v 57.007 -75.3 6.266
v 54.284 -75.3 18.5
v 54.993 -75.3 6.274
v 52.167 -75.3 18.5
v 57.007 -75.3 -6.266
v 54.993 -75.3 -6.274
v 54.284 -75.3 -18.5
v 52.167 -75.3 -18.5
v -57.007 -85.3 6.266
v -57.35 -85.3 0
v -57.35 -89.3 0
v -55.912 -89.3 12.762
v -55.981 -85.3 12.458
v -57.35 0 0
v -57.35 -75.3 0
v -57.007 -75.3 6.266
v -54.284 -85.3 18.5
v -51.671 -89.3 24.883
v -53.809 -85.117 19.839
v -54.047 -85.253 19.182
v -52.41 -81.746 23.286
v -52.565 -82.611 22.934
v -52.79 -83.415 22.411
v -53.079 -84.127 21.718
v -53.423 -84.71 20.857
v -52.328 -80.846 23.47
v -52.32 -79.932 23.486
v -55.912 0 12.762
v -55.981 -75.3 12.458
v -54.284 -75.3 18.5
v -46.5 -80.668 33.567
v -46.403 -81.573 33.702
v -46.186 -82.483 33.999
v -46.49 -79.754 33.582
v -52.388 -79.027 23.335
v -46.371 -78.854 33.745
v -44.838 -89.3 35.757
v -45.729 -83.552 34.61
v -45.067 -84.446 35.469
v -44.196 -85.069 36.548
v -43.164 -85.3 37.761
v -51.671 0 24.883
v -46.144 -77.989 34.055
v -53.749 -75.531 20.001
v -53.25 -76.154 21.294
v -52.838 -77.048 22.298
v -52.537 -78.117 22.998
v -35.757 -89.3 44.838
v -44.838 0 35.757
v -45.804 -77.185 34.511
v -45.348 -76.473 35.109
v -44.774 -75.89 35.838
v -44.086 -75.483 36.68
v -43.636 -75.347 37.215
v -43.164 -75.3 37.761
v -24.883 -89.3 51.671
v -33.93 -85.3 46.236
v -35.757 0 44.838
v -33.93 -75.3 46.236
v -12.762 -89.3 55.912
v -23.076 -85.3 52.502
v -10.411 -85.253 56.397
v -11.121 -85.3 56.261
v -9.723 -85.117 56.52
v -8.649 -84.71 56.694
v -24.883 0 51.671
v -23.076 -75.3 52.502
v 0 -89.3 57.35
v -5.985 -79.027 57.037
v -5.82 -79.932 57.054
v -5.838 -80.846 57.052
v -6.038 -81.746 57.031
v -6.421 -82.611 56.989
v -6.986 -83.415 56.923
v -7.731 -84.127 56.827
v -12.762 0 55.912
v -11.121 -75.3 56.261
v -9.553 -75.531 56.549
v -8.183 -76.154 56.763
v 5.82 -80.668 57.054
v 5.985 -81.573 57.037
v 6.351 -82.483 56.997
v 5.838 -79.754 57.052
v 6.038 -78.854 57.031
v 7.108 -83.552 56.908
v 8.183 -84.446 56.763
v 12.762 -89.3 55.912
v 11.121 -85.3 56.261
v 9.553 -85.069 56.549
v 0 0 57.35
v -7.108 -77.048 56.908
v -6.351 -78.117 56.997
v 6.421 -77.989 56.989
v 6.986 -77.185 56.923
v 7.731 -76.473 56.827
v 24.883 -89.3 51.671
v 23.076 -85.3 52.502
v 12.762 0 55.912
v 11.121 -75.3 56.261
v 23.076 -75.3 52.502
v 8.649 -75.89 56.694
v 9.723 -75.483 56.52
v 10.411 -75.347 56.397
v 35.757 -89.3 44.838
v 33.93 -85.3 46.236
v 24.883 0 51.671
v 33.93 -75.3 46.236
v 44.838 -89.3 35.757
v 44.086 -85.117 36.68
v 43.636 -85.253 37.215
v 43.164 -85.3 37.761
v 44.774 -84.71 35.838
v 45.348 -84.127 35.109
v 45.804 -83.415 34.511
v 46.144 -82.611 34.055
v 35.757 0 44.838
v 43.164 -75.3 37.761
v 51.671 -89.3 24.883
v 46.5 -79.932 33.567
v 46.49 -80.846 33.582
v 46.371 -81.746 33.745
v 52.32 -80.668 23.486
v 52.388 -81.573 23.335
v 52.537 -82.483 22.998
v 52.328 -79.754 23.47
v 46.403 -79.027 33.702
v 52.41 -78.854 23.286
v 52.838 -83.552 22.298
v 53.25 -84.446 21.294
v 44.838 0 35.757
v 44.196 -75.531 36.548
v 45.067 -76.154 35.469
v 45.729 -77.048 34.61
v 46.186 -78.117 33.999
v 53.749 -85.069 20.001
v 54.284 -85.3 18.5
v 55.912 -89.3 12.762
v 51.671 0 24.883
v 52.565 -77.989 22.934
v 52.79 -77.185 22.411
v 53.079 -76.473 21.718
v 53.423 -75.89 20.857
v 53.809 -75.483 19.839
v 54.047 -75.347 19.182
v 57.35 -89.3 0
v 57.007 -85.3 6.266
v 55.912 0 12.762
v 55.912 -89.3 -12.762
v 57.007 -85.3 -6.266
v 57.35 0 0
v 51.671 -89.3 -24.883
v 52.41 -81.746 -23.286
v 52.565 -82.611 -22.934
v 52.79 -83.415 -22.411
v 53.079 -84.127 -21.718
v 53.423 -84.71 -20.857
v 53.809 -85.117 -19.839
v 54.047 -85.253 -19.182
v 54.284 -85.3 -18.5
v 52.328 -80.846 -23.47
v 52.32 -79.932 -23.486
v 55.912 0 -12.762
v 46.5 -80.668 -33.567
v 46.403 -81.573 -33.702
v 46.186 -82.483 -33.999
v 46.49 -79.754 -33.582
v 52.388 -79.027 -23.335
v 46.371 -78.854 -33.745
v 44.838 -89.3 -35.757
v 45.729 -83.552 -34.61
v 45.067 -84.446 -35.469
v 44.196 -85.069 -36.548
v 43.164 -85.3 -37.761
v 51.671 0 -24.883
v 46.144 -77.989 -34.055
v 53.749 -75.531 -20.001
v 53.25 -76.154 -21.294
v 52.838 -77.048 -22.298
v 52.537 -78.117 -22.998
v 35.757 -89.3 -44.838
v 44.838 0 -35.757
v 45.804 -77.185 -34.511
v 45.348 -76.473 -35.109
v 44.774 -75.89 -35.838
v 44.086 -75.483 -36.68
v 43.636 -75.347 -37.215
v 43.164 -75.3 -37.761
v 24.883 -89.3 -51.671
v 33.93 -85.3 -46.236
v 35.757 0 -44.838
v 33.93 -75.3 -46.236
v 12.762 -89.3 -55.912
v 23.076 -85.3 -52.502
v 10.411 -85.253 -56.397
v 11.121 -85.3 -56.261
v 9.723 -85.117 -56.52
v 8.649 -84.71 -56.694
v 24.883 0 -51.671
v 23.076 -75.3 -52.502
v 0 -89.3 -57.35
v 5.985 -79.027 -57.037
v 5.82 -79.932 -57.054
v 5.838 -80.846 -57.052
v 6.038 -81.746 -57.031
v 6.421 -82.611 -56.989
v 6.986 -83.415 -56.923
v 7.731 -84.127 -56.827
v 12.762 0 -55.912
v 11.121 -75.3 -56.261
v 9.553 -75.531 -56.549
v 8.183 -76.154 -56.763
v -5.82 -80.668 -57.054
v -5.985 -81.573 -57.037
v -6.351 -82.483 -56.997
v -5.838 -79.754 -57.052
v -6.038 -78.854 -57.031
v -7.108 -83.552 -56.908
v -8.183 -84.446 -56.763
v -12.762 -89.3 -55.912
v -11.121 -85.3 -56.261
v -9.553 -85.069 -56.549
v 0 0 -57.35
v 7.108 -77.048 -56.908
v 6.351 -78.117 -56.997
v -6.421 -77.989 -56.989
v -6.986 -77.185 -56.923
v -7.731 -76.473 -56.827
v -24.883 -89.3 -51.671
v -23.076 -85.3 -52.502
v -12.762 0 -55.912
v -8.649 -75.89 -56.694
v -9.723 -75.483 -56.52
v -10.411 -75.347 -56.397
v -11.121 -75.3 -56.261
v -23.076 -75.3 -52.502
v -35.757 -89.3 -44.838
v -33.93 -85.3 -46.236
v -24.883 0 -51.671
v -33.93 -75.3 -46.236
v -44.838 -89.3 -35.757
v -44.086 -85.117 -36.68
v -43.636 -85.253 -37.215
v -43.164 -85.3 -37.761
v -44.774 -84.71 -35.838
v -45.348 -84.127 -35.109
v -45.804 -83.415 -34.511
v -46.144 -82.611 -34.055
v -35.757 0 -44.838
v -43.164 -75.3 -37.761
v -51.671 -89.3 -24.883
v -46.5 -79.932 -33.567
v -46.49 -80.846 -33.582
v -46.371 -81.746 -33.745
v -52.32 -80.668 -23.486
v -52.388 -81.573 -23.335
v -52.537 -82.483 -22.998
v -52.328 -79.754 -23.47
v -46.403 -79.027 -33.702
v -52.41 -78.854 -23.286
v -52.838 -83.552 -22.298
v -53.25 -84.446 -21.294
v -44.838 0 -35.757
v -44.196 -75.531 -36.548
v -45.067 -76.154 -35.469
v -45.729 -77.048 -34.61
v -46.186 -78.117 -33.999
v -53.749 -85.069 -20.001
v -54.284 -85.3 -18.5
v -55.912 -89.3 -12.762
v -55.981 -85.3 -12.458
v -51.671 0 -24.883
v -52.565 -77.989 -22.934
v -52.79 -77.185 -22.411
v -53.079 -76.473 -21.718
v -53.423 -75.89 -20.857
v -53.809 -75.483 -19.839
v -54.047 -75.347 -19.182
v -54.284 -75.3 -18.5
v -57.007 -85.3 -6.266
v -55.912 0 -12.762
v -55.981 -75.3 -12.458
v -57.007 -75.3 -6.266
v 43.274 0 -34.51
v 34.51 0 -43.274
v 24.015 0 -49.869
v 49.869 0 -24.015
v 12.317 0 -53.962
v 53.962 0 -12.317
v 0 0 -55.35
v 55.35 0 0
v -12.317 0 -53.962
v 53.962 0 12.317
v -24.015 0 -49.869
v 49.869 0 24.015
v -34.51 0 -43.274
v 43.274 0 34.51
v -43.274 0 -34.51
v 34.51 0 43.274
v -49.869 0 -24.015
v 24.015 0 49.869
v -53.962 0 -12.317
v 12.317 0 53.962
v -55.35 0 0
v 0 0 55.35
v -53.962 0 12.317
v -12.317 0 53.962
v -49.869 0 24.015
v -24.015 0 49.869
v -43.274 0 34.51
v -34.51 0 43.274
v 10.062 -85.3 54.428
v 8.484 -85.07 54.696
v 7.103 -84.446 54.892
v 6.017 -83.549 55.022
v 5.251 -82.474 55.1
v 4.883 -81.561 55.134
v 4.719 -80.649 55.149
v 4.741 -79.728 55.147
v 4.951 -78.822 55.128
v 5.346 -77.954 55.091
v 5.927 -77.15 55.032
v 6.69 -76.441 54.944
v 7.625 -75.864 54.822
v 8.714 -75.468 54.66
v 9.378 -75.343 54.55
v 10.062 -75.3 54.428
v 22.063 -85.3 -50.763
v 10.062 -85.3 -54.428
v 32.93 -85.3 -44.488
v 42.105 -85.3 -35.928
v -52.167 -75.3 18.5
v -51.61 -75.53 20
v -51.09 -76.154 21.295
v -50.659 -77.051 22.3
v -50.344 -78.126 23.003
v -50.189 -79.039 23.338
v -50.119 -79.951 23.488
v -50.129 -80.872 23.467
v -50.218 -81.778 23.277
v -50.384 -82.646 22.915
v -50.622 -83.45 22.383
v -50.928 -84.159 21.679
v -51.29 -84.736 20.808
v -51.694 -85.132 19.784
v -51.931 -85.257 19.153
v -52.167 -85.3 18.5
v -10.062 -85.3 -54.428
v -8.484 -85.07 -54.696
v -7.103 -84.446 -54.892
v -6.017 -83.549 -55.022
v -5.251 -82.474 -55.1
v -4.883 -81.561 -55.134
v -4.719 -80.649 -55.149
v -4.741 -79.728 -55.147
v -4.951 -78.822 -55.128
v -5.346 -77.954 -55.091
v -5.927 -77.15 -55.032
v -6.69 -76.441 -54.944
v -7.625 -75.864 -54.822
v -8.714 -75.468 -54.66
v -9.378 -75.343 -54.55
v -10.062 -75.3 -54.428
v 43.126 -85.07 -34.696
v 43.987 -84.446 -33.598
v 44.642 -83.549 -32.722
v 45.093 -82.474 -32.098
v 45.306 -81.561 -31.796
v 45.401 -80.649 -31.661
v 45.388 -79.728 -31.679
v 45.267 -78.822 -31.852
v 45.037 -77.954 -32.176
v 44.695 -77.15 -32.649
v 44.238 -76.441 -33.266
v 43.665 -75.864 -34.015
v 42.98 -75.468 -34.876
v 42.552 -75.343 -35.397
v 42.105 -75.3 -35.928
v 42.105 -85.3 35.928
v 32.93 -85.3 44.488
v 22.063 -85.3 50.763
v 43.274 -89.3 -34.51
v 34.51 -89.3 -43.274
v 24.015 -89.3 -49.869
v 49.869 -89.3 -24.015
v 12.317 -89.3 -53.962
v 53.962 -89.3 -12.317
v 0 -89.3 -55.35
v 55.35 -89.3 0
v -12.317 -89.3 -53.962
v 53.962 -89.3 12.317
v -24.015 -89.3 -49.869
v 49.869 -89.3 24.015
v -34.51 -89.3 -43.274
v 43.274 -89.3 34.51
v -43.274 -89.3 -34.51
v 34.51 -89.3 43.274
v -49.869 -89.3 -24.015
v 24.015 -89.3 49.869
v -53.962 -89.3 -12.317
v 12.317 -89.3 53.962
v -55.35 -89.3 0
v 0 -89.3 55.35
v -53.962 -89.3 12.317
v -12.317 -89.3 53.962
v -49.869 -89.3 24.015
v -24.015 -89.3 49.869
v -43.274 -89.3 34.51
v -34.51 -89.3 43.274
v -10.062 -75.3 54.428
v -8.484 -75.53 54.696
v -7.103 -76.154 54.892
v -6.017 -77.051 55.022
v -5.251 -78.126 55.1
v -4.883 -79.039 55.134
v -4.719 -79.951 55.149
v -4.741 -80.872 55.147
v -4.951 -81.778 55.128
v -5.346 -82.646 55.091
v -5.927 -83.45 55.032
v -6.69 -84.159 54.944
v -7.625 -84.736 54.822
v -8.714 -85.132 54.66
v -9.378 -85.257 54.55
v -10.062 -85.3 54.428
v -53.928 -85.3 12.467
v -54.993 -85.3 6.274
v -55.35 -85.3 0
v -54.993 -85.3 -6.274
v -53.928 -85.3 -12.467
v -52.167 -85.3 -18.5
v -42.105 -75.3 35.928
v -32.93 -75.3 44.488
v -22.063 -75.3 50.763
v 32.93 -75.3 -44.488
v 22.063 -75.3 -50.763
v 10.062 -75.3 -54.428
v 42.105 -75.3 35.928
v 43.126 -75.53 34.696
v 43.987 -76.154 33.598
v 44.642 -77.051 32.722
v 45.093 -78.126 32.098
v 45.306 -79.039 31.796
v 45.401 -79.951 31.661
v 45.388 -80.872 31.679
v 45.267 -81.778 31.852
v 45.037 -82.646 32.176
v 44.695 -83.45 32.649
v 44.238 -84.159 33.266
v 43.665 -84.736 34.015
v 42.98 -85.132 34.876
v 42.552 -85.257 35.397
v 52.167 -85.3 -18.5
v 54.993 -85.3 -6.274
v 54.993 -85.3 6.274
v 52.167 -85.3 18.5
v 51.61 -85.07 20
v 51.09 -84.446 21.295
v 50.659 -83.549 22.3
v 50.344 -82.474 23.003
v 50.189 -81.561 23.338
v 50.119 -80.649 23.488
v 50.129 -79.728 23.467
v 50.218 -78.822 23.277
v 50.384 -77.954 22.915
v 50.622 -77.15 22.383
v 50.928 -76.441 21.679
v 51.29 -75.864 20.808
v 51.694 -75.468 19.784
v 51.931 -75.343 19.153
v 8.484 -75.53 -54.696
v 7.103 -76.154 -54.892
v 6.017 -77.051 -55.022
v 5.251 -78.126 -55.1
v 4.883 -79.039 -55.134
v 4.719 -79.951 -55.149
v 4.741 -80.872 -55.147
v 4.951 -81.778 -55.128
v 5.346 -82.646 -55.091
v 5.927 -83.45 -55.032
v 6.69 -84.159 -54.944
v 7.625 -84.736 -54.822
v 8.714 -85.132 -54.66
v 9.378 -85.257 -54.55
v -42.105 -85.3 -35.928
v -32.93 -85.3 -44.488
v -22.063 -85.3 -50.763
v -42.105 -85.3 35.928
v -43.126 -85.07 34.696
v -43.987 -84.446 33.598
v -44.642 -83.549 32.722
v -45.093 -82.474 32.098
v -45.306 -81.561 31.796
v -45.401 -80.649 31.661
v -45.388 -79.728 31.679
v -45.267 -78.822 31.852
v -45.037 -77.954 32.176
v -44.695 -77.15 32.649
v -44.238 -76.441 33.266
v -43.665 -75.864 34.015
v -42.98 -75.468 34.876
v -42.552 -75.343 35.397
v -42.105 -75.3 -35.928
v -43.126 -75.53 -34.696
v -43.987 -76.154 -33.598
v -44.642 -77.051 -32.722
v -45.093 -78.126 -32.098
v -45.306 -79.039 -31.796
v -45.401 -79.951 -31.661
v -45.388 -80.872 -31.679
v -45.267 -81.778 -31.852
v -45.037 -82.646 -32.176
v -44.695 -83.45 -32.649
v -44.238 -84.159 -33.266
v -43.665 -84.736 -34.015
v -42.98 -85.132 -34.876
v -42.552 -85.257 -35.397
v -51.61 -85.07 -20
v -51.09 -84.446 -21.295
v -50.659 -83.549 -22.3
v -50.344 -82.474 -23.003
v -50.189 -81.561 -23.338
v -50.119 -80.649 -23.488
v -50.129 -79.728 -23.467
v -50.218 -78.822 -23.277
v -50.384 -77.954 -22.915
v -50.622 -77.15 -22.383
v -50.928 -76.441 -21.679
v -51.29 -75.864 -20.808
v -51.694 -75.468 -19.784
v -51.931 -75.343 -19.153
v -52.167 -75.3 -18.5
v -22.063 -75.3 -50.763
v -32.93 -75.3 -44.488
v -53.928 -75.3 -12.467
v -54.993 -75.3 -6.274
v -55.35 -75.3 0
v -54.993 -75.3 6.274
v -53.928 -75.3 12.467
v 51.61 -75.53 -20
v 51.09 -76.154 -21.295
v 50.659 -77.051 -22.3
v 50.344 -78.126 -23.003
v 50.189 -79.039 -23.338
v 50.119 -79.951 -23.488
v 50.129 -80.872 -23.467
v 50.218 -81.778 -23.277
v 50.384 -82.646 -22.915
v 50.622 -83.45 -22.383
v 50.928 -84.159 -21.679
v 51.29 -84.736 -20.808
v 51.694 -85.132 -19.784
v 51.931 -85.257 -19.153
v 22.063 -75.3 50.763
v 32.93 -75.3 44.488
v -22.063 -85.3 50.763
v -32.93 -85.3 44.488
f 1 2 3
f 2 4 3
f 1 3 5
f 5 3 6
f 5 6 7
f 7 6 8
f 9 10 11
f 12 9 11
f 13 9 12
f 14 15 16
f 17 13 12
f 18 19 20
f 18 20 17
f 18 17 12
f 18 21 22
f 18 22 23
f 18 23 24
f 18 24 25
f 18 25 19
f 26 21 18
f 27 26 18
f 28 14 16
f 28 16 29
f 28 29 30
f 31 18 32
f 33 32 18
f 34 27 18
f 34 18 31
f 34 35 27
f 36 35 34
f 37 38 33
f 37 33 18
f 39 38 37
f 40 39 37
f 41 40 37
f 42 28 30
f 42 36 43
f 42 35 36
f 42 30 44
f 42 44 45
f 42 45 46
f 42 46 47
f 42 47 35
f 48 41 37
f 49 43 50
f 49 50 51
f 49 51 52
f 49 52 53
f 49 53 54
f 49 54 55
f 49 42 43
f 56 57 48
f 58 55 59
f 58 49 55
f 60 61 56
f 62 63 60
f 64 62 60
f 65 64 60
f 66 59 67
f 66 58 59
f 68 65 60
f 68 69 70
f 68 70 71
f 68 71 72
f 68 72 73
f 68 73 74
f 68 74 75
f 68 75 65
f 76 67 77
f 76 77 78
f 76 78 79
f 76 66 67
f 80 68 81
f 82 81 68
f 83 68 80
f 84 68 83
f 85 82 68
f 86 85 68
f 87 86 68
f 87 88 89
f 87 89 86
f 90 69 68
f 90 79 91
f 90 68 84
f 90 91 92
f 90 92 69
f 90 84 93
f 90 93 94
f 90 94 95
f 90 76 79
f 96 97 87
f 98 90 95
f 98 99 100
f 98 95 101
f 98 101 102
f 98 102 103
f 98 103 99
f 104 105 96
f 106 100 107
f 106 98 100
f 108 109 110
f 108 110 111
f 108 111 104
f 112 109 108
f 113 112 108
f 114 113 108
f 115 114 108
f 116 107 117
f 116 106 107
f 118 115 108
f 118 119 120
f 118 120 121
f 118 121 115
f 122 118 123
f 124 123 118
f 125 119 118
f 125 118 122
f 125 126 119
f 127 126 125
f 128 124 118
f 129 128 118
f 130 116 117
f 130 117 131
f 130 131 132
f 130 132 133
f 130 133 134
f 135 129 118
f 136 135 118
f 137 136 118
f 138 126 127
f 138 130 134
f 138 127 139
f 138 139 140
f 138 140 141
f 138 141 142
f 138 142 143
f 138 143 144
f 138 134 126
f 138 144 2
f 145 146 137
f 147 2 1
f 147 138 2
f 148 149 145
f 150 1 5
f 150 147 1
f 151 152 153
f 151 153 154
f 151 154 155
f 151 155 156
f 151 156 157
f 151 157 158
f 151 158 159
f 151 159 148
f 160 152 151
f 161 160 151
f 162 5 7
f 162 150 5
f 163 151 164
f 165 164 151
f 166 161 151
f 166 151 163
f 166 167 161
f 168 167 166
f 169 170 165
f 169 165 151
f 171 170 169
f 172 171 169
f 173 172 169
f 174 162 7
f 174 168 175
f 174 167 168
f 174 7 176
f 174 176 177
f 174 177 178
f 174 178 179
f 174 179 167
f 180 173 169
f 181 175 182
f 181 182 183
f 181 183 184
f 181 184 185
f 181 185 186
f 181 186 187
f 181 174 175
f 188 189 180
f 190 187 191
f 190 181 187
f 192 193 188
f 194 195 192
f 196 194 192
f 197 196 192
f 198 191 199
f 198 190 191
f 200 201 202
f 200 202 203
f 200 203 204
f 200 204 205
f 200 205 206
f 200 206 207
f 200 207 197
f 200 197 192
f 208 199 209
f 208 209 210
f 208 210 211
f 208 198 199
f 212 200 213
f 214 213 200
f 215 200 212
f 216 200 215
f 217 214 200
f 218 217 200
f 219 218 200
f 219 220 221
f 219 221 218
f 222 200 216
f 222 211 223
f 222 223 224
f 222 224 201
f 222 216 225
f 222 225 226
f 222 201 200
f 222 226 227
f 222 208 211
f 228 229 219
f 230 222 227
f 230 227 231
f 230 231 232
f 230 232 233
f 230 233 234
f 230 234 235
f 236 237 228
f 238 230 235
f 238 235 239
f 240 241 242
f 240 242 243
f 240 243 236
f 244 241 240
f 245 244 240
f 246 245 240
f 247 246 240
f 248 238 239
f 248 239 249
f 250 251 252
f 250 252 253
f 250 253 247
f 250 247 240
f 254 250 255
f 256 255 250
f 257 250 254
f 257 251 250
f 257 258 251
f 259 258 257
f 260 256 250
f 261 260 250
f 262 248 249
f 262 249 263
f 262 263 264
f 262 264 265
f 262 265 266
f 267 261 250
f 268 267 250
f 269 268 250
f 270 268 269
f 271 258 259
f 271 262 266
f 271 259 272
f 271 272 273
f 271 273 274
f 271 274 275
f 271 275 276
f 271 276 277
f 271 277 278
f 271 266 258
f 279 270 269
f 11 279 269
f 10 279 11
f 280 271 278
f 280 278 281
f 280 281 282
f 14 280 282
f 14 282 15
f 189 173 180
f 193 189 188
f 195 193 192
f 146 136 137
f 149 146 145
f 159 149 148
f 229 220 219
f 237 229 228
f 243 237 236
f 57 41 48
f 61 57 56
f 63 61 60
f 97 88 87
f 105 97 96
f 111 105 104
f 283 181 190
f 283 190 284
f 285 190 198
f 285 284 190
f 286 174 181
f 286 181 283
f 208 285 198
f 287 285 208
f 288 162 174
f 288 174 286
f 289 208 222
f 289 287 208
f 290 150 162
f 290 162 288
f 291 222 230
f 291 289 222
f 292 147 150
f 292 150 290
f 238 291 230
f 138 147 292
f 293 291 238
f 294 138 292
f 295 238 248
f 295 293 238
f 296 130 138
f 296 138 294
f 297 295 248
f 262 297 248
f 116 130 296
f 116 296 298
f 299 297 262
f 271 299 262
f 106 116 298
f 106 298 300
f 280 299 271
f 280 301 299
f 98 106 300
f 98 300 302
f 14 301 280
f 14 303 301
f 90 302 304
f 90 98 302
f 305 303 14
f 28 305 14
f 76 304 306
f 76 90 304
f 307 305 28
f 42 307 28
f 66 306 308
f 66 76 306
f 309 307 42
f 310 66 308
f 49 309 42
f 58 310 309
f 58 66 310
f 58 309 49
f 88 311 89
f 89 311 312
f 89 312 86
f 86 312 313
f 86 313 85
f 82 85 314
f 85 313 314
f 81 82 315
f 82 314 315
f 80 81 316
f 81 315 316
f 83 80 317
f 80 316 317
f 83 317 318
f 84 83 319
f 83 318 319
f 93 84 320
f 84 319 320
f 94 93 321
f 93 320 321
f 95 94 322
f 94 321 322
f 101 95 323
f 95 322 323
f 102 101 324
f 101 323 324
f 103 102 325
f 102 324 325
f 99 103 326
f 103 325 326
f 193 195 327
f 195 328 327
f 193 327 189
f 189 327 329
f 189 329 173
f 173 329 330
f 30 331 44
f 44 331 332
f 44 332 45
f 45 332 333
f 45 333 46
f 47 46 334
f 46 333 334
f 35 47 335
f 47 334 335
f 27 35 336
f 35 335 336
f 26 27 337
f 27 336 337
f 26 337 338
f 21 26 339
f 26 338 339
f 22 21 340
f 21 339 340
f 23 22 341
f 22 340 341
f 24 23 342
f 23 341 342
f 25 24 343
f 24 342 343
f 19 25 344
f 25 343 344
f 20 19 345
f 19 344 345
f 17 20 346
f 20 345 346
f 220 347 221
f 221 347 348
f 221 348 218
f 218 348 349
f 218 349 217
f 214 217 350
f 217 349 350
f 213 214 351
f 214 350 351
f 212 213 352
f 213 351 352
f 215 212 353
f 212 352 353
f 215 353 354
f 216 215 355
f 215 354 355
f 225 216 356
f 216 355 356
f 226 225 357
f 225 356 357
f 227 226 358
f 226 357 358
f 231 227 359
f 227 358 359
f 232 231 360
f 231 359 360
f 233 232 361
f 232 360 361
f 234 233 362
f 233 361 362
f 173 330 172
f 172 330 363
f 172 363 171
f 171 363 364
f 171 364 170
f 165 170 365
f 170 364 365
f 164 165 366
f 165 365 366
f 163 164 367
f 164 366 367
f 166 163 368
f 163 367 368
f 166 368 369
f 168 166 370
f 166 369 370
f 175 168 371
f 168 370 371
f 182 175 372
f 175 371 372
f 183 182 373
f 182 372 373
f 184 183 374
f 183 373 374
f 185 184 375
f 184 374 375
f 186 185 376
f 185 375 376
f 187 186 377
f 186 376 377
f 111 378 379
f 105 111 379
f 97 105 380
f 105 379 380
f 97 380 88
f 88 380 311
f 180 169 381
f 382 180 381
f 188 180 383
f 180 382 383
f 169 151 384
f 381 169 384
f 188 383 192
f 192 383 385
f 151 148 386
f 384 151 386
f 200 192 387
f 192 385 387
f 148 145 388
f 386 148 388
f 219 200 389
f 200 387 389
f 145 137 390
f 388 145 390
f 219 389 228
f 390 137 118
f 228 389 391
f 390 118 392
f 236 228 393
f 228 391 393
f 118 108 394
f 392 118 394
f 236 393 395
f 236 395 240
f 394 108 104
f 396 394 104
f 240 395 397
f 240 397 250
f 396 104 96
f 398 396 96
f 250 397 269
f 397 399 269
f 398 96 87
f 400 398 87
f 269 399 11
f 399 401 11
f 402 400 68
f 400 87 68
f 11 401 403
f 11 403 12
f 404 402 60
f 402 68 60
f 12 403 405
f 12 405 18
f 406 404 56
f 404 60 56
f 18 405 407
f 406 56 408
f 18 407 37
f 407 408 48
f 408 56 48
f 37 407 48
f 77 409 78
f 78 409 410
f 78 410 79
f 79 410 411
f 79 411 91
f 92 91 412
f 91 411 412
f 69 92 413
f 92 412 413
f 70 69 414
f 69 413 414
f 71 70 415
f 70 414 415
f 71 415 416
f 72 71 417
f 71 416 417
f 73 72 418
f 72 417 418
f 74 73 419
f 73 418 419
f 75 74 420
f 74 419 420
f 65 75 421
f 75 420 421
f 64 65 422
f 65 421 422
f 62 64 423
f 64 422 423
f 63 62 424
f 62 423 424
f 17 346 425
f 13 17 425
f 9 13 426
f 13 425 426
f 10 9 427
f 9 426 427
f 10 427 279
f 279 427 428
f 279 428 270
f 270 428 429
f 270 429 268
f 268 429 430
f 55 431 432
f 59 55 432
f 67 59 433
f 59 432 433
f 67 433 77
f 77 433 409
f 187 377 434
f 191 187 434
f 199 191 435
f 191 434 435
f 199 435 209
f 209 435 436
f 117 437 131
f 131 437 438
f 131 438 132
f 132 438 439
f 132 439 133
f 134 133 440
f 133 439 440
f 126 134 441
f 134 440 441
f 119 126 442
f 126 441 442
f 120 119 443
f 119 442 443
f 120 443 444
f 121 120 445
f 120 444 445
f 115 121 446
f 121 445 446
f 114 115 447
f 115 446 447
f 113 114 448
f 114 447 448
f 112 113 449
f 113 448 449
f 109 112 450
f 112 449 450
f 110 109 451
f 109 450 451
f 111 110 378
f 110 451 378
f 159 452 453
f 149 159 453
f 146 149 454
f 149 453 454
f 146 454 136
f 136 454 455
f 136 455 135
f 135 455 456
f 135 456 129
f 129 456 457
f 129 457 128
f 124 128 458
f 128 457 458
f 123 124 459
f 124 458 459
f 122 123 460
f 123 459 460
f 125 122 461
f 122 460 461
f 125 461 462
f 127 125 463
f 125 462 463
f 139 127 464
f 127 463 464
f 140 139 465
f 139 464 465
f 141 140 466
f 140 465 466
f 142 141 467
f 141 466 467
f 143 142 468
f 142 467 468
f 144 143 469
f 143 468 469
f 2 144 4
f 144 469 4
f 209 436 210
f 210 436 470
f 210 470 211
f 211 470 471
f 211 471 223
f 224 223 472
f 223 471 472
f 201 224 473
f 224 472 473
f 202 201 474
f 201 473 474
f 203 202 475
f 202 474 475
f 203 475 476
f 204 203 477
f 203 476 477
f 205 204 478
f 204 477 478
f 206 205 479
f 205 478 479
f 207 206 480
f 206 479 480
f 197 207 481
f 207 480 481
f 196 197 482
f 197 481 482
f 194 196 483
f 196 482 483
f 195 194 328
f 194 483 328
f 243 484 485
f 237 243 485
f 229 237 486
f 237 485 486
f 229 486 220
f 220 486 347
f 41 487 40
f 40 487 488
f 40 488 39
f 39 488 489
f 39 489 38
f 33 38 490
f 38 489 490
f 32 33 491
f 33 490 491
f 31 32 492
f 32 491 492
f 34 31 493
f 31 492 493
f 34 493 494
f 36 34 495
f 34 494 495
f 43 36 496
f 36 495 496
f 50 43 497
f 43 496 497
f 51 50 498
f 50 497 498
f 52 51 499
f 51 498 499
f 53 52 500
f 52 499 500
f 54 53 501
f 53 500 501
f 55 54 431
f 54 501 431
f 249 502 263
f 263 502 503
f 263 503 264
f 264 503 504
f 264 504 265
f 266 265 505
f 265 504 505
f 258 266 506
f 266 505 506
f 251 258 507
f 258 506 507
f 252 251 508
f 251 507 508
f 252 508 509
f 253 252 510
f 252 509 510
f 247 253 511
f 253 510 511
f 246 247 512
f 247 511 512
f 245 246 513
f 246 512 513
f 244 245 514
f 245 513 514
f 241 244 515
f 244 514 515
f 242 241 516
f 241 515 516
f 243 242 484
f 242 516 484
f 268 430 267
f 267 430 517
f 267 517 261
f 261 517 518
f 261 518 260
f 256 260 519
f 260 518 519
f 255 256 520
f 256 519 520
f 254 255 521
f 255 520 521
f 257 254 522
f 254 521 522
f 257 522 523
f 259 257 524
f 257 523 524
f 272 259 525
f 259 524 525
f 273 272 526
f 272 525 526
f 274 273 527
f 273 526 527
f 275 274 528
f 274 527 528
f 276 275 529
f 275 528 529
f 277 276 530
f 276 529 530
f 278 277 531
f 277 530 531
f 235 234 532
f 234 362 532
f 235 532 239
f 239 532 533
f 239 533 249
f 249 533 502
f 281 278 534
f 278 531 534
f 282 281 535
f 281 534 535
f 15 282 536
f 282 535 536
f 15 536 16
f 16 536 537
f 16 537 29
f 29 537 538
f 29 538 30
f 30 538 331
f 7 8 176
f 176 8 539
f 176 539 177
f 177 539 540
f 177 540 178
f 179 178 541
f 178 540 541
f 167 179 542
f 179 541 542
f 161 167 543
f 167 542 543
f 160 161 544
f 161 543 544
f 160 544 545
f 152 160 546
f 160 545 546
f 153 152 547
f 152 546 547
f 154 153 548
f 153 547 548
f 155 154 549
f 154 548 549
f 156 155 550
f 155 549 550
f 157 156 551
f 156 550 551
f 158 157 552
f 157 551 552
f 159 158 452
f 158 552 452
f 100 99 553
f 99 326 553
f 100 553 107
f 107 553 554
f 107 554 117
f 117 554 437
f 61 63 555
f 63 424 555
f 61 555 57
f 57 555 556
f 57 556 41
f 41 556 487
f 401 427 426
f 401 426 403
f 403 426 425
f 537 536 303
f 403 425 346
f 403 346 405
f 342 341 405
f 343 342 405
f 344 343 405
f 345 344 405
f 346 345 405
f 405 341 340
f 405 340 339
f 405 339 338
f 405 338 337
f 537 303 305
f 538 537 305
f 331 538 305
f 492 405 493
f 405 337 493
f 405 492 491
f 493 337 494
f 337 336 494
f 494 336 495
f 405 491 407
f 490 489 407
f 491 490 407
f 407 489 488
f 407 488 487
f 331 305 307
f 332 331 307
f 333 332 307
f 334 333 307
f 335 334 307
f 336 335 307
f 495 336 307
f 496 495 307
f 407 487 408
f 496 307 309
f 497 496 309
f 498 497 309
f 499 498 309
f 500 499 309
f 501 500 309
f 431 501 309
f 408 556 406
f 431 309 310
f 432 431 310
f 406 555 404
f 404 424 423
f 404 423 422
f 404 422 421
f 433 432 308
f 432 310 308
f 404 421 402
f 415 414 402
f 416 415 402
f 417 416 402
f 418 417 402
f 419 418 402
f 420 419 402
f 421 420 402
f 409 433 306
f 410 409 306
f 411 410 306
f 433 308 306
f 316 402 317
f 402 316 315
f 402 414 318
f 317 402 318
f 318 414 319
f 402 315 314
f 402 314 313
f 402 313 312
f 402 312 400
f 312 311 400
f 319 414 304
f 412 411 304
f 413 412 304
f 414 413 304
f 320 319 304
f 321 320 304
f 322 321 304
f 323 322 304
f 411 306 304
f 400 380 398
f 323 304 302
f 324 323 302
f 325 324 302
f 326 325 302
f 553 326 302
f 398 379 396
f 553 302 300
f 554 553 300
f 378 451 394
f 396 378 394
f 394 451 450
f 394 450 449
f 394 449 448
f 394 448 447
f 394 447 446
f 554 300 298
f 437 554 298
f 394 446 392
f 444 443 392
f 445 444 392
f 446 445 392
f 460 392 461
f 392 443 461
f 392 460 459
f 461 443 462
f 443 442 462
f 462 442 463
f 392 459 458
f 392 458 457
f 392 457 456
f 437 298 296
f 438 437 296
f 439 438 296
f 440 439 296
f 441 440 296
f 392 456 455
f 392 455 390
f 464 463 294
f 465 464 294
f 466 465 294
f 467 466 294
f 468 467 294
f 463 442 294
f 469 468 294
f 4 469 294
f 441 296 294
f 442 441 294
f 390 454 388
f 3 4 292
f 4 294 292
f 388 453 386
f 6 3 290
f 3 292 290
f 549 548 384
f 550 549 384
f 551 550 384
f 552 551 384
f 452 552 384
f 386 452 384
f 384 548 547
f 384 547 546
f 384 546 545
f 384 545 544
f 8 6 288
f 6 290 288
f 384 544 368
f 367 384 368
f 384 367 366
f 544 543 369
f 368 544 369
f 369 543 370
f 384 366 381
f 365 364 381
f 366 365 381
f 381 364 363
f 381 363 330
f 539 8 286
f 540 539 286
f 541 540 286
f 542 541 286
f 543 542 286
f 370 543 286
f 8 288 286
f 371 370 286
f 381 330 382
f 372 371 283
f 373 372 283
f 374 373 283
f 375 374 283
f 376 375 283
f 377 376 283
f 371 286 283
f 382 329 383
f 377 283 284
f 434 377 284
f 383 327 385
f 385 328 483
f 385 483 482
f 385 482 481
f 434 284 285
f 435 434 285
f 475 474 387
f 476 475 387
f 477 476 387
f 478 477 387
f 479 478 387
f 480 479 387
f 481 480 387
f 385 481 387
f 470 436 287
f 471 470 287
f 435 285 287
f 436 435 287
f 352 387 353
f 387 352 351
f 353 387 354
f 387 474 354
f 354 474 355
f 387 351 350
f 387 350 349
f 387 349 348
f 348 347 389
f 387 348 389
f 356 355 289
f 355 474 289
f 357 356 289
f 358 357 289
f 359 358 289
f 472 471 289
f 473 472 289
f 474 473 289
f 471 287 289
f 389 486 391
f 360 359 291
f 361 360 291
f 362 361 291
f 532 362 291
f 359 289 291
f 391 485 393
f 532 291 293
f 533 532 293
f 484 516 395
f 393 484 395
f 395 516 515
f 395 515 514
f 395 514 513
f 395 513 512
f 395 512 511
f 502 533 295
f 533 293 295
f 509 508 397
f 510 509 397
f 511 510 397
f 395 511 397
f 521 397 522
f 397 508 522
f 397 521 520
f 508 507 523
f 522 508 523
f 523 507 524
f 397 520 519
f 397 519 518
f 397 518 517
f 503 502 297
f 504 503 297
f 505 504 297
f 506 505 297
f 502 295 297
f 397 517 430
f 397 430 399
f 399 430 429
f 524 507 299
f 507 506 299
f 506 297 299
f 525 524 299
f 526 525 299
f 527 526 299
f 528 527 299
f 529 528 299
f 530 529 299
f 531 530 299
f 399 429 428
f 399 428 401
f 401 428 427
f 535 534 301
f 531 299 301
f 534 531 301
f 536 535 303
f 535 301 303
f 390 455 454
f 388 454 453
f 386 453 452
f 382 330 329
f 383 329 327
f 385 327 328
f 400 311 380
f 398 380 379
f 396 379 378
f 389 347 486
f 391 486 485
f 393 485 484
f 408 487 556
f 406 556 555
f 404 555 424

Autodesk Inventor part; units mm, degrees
ref_plane "YZ Plane" through (0, 0, 0) normal (1, 0, 0) x (0, 1, 0)
ref_plane "XZ Plane" through (0, 0, 0) normal (0, 1, 0) x (-1, 0, 0)
ref_plane "XY Plane" through (0, 0, 0) normal (0, 0, 1) x (1, 0, 0)
sketch "Esquisse1" plane through (0, 0, 0) normal (0, 1, 0) x (-1, 0, 0)
  line L0 (0, -80.29) -> (0, 80.29) construction
  line L1 (-80.29, 0) -> (80.29, 0) construction
  circle A0 centre (0, 0) radius 57.35
  circle A1 centre (0, 0) radius 55.35
  circle A2 centre (0, 0) radius 16 construction
  circle A3 centre (0, 0) radius 57.35 construction
  dimension "d0" = 2
extrude "Extrusion1" add sketch "Esquisse1" against normal blind 89.3
sketch "Esquisse2" plane through (0, 0, 0) normal (1, 0, 0) x (0, 1, 0)
  line L0 (-80.3, 18.5) -> (-80.3, -18.5) construction
  line L1 (-85.3, 18.5) -> (-85.3, -18.5)
  line L2 (-75.3, -18.5) -> (-75.3, 18.5)
  arc A0 (-75.3, 18.5) -> (-85.3, 18.5) centre (-80.3, 18.5) ccw
  arc A1 (-85.3, -18.5) -> (-75.3, -18.5) centre (-80.3, -18.5) ccw
  line L3 (-89.3, 57.35) -> (-89.3, -57.35) construction
  line L4 (-81.6, 0) -> (13.6, 0) construction
  point P0 (0, 0)
  point P1 (-80.3, 0)
  dimension "d3" = 4
  dimension "d4" = 5
  dimension "d5" = 37
extrude "Extrusion2" cut sketch "Esquisse2" against normal blind 68
pattern_circular "Réseau circulaire1" count 6 over 360 about axis through (0, -10, 0) along (0, 1, 0) of "Extrusion2"
properties part number "Colossus_7kW_Rotor_body"
